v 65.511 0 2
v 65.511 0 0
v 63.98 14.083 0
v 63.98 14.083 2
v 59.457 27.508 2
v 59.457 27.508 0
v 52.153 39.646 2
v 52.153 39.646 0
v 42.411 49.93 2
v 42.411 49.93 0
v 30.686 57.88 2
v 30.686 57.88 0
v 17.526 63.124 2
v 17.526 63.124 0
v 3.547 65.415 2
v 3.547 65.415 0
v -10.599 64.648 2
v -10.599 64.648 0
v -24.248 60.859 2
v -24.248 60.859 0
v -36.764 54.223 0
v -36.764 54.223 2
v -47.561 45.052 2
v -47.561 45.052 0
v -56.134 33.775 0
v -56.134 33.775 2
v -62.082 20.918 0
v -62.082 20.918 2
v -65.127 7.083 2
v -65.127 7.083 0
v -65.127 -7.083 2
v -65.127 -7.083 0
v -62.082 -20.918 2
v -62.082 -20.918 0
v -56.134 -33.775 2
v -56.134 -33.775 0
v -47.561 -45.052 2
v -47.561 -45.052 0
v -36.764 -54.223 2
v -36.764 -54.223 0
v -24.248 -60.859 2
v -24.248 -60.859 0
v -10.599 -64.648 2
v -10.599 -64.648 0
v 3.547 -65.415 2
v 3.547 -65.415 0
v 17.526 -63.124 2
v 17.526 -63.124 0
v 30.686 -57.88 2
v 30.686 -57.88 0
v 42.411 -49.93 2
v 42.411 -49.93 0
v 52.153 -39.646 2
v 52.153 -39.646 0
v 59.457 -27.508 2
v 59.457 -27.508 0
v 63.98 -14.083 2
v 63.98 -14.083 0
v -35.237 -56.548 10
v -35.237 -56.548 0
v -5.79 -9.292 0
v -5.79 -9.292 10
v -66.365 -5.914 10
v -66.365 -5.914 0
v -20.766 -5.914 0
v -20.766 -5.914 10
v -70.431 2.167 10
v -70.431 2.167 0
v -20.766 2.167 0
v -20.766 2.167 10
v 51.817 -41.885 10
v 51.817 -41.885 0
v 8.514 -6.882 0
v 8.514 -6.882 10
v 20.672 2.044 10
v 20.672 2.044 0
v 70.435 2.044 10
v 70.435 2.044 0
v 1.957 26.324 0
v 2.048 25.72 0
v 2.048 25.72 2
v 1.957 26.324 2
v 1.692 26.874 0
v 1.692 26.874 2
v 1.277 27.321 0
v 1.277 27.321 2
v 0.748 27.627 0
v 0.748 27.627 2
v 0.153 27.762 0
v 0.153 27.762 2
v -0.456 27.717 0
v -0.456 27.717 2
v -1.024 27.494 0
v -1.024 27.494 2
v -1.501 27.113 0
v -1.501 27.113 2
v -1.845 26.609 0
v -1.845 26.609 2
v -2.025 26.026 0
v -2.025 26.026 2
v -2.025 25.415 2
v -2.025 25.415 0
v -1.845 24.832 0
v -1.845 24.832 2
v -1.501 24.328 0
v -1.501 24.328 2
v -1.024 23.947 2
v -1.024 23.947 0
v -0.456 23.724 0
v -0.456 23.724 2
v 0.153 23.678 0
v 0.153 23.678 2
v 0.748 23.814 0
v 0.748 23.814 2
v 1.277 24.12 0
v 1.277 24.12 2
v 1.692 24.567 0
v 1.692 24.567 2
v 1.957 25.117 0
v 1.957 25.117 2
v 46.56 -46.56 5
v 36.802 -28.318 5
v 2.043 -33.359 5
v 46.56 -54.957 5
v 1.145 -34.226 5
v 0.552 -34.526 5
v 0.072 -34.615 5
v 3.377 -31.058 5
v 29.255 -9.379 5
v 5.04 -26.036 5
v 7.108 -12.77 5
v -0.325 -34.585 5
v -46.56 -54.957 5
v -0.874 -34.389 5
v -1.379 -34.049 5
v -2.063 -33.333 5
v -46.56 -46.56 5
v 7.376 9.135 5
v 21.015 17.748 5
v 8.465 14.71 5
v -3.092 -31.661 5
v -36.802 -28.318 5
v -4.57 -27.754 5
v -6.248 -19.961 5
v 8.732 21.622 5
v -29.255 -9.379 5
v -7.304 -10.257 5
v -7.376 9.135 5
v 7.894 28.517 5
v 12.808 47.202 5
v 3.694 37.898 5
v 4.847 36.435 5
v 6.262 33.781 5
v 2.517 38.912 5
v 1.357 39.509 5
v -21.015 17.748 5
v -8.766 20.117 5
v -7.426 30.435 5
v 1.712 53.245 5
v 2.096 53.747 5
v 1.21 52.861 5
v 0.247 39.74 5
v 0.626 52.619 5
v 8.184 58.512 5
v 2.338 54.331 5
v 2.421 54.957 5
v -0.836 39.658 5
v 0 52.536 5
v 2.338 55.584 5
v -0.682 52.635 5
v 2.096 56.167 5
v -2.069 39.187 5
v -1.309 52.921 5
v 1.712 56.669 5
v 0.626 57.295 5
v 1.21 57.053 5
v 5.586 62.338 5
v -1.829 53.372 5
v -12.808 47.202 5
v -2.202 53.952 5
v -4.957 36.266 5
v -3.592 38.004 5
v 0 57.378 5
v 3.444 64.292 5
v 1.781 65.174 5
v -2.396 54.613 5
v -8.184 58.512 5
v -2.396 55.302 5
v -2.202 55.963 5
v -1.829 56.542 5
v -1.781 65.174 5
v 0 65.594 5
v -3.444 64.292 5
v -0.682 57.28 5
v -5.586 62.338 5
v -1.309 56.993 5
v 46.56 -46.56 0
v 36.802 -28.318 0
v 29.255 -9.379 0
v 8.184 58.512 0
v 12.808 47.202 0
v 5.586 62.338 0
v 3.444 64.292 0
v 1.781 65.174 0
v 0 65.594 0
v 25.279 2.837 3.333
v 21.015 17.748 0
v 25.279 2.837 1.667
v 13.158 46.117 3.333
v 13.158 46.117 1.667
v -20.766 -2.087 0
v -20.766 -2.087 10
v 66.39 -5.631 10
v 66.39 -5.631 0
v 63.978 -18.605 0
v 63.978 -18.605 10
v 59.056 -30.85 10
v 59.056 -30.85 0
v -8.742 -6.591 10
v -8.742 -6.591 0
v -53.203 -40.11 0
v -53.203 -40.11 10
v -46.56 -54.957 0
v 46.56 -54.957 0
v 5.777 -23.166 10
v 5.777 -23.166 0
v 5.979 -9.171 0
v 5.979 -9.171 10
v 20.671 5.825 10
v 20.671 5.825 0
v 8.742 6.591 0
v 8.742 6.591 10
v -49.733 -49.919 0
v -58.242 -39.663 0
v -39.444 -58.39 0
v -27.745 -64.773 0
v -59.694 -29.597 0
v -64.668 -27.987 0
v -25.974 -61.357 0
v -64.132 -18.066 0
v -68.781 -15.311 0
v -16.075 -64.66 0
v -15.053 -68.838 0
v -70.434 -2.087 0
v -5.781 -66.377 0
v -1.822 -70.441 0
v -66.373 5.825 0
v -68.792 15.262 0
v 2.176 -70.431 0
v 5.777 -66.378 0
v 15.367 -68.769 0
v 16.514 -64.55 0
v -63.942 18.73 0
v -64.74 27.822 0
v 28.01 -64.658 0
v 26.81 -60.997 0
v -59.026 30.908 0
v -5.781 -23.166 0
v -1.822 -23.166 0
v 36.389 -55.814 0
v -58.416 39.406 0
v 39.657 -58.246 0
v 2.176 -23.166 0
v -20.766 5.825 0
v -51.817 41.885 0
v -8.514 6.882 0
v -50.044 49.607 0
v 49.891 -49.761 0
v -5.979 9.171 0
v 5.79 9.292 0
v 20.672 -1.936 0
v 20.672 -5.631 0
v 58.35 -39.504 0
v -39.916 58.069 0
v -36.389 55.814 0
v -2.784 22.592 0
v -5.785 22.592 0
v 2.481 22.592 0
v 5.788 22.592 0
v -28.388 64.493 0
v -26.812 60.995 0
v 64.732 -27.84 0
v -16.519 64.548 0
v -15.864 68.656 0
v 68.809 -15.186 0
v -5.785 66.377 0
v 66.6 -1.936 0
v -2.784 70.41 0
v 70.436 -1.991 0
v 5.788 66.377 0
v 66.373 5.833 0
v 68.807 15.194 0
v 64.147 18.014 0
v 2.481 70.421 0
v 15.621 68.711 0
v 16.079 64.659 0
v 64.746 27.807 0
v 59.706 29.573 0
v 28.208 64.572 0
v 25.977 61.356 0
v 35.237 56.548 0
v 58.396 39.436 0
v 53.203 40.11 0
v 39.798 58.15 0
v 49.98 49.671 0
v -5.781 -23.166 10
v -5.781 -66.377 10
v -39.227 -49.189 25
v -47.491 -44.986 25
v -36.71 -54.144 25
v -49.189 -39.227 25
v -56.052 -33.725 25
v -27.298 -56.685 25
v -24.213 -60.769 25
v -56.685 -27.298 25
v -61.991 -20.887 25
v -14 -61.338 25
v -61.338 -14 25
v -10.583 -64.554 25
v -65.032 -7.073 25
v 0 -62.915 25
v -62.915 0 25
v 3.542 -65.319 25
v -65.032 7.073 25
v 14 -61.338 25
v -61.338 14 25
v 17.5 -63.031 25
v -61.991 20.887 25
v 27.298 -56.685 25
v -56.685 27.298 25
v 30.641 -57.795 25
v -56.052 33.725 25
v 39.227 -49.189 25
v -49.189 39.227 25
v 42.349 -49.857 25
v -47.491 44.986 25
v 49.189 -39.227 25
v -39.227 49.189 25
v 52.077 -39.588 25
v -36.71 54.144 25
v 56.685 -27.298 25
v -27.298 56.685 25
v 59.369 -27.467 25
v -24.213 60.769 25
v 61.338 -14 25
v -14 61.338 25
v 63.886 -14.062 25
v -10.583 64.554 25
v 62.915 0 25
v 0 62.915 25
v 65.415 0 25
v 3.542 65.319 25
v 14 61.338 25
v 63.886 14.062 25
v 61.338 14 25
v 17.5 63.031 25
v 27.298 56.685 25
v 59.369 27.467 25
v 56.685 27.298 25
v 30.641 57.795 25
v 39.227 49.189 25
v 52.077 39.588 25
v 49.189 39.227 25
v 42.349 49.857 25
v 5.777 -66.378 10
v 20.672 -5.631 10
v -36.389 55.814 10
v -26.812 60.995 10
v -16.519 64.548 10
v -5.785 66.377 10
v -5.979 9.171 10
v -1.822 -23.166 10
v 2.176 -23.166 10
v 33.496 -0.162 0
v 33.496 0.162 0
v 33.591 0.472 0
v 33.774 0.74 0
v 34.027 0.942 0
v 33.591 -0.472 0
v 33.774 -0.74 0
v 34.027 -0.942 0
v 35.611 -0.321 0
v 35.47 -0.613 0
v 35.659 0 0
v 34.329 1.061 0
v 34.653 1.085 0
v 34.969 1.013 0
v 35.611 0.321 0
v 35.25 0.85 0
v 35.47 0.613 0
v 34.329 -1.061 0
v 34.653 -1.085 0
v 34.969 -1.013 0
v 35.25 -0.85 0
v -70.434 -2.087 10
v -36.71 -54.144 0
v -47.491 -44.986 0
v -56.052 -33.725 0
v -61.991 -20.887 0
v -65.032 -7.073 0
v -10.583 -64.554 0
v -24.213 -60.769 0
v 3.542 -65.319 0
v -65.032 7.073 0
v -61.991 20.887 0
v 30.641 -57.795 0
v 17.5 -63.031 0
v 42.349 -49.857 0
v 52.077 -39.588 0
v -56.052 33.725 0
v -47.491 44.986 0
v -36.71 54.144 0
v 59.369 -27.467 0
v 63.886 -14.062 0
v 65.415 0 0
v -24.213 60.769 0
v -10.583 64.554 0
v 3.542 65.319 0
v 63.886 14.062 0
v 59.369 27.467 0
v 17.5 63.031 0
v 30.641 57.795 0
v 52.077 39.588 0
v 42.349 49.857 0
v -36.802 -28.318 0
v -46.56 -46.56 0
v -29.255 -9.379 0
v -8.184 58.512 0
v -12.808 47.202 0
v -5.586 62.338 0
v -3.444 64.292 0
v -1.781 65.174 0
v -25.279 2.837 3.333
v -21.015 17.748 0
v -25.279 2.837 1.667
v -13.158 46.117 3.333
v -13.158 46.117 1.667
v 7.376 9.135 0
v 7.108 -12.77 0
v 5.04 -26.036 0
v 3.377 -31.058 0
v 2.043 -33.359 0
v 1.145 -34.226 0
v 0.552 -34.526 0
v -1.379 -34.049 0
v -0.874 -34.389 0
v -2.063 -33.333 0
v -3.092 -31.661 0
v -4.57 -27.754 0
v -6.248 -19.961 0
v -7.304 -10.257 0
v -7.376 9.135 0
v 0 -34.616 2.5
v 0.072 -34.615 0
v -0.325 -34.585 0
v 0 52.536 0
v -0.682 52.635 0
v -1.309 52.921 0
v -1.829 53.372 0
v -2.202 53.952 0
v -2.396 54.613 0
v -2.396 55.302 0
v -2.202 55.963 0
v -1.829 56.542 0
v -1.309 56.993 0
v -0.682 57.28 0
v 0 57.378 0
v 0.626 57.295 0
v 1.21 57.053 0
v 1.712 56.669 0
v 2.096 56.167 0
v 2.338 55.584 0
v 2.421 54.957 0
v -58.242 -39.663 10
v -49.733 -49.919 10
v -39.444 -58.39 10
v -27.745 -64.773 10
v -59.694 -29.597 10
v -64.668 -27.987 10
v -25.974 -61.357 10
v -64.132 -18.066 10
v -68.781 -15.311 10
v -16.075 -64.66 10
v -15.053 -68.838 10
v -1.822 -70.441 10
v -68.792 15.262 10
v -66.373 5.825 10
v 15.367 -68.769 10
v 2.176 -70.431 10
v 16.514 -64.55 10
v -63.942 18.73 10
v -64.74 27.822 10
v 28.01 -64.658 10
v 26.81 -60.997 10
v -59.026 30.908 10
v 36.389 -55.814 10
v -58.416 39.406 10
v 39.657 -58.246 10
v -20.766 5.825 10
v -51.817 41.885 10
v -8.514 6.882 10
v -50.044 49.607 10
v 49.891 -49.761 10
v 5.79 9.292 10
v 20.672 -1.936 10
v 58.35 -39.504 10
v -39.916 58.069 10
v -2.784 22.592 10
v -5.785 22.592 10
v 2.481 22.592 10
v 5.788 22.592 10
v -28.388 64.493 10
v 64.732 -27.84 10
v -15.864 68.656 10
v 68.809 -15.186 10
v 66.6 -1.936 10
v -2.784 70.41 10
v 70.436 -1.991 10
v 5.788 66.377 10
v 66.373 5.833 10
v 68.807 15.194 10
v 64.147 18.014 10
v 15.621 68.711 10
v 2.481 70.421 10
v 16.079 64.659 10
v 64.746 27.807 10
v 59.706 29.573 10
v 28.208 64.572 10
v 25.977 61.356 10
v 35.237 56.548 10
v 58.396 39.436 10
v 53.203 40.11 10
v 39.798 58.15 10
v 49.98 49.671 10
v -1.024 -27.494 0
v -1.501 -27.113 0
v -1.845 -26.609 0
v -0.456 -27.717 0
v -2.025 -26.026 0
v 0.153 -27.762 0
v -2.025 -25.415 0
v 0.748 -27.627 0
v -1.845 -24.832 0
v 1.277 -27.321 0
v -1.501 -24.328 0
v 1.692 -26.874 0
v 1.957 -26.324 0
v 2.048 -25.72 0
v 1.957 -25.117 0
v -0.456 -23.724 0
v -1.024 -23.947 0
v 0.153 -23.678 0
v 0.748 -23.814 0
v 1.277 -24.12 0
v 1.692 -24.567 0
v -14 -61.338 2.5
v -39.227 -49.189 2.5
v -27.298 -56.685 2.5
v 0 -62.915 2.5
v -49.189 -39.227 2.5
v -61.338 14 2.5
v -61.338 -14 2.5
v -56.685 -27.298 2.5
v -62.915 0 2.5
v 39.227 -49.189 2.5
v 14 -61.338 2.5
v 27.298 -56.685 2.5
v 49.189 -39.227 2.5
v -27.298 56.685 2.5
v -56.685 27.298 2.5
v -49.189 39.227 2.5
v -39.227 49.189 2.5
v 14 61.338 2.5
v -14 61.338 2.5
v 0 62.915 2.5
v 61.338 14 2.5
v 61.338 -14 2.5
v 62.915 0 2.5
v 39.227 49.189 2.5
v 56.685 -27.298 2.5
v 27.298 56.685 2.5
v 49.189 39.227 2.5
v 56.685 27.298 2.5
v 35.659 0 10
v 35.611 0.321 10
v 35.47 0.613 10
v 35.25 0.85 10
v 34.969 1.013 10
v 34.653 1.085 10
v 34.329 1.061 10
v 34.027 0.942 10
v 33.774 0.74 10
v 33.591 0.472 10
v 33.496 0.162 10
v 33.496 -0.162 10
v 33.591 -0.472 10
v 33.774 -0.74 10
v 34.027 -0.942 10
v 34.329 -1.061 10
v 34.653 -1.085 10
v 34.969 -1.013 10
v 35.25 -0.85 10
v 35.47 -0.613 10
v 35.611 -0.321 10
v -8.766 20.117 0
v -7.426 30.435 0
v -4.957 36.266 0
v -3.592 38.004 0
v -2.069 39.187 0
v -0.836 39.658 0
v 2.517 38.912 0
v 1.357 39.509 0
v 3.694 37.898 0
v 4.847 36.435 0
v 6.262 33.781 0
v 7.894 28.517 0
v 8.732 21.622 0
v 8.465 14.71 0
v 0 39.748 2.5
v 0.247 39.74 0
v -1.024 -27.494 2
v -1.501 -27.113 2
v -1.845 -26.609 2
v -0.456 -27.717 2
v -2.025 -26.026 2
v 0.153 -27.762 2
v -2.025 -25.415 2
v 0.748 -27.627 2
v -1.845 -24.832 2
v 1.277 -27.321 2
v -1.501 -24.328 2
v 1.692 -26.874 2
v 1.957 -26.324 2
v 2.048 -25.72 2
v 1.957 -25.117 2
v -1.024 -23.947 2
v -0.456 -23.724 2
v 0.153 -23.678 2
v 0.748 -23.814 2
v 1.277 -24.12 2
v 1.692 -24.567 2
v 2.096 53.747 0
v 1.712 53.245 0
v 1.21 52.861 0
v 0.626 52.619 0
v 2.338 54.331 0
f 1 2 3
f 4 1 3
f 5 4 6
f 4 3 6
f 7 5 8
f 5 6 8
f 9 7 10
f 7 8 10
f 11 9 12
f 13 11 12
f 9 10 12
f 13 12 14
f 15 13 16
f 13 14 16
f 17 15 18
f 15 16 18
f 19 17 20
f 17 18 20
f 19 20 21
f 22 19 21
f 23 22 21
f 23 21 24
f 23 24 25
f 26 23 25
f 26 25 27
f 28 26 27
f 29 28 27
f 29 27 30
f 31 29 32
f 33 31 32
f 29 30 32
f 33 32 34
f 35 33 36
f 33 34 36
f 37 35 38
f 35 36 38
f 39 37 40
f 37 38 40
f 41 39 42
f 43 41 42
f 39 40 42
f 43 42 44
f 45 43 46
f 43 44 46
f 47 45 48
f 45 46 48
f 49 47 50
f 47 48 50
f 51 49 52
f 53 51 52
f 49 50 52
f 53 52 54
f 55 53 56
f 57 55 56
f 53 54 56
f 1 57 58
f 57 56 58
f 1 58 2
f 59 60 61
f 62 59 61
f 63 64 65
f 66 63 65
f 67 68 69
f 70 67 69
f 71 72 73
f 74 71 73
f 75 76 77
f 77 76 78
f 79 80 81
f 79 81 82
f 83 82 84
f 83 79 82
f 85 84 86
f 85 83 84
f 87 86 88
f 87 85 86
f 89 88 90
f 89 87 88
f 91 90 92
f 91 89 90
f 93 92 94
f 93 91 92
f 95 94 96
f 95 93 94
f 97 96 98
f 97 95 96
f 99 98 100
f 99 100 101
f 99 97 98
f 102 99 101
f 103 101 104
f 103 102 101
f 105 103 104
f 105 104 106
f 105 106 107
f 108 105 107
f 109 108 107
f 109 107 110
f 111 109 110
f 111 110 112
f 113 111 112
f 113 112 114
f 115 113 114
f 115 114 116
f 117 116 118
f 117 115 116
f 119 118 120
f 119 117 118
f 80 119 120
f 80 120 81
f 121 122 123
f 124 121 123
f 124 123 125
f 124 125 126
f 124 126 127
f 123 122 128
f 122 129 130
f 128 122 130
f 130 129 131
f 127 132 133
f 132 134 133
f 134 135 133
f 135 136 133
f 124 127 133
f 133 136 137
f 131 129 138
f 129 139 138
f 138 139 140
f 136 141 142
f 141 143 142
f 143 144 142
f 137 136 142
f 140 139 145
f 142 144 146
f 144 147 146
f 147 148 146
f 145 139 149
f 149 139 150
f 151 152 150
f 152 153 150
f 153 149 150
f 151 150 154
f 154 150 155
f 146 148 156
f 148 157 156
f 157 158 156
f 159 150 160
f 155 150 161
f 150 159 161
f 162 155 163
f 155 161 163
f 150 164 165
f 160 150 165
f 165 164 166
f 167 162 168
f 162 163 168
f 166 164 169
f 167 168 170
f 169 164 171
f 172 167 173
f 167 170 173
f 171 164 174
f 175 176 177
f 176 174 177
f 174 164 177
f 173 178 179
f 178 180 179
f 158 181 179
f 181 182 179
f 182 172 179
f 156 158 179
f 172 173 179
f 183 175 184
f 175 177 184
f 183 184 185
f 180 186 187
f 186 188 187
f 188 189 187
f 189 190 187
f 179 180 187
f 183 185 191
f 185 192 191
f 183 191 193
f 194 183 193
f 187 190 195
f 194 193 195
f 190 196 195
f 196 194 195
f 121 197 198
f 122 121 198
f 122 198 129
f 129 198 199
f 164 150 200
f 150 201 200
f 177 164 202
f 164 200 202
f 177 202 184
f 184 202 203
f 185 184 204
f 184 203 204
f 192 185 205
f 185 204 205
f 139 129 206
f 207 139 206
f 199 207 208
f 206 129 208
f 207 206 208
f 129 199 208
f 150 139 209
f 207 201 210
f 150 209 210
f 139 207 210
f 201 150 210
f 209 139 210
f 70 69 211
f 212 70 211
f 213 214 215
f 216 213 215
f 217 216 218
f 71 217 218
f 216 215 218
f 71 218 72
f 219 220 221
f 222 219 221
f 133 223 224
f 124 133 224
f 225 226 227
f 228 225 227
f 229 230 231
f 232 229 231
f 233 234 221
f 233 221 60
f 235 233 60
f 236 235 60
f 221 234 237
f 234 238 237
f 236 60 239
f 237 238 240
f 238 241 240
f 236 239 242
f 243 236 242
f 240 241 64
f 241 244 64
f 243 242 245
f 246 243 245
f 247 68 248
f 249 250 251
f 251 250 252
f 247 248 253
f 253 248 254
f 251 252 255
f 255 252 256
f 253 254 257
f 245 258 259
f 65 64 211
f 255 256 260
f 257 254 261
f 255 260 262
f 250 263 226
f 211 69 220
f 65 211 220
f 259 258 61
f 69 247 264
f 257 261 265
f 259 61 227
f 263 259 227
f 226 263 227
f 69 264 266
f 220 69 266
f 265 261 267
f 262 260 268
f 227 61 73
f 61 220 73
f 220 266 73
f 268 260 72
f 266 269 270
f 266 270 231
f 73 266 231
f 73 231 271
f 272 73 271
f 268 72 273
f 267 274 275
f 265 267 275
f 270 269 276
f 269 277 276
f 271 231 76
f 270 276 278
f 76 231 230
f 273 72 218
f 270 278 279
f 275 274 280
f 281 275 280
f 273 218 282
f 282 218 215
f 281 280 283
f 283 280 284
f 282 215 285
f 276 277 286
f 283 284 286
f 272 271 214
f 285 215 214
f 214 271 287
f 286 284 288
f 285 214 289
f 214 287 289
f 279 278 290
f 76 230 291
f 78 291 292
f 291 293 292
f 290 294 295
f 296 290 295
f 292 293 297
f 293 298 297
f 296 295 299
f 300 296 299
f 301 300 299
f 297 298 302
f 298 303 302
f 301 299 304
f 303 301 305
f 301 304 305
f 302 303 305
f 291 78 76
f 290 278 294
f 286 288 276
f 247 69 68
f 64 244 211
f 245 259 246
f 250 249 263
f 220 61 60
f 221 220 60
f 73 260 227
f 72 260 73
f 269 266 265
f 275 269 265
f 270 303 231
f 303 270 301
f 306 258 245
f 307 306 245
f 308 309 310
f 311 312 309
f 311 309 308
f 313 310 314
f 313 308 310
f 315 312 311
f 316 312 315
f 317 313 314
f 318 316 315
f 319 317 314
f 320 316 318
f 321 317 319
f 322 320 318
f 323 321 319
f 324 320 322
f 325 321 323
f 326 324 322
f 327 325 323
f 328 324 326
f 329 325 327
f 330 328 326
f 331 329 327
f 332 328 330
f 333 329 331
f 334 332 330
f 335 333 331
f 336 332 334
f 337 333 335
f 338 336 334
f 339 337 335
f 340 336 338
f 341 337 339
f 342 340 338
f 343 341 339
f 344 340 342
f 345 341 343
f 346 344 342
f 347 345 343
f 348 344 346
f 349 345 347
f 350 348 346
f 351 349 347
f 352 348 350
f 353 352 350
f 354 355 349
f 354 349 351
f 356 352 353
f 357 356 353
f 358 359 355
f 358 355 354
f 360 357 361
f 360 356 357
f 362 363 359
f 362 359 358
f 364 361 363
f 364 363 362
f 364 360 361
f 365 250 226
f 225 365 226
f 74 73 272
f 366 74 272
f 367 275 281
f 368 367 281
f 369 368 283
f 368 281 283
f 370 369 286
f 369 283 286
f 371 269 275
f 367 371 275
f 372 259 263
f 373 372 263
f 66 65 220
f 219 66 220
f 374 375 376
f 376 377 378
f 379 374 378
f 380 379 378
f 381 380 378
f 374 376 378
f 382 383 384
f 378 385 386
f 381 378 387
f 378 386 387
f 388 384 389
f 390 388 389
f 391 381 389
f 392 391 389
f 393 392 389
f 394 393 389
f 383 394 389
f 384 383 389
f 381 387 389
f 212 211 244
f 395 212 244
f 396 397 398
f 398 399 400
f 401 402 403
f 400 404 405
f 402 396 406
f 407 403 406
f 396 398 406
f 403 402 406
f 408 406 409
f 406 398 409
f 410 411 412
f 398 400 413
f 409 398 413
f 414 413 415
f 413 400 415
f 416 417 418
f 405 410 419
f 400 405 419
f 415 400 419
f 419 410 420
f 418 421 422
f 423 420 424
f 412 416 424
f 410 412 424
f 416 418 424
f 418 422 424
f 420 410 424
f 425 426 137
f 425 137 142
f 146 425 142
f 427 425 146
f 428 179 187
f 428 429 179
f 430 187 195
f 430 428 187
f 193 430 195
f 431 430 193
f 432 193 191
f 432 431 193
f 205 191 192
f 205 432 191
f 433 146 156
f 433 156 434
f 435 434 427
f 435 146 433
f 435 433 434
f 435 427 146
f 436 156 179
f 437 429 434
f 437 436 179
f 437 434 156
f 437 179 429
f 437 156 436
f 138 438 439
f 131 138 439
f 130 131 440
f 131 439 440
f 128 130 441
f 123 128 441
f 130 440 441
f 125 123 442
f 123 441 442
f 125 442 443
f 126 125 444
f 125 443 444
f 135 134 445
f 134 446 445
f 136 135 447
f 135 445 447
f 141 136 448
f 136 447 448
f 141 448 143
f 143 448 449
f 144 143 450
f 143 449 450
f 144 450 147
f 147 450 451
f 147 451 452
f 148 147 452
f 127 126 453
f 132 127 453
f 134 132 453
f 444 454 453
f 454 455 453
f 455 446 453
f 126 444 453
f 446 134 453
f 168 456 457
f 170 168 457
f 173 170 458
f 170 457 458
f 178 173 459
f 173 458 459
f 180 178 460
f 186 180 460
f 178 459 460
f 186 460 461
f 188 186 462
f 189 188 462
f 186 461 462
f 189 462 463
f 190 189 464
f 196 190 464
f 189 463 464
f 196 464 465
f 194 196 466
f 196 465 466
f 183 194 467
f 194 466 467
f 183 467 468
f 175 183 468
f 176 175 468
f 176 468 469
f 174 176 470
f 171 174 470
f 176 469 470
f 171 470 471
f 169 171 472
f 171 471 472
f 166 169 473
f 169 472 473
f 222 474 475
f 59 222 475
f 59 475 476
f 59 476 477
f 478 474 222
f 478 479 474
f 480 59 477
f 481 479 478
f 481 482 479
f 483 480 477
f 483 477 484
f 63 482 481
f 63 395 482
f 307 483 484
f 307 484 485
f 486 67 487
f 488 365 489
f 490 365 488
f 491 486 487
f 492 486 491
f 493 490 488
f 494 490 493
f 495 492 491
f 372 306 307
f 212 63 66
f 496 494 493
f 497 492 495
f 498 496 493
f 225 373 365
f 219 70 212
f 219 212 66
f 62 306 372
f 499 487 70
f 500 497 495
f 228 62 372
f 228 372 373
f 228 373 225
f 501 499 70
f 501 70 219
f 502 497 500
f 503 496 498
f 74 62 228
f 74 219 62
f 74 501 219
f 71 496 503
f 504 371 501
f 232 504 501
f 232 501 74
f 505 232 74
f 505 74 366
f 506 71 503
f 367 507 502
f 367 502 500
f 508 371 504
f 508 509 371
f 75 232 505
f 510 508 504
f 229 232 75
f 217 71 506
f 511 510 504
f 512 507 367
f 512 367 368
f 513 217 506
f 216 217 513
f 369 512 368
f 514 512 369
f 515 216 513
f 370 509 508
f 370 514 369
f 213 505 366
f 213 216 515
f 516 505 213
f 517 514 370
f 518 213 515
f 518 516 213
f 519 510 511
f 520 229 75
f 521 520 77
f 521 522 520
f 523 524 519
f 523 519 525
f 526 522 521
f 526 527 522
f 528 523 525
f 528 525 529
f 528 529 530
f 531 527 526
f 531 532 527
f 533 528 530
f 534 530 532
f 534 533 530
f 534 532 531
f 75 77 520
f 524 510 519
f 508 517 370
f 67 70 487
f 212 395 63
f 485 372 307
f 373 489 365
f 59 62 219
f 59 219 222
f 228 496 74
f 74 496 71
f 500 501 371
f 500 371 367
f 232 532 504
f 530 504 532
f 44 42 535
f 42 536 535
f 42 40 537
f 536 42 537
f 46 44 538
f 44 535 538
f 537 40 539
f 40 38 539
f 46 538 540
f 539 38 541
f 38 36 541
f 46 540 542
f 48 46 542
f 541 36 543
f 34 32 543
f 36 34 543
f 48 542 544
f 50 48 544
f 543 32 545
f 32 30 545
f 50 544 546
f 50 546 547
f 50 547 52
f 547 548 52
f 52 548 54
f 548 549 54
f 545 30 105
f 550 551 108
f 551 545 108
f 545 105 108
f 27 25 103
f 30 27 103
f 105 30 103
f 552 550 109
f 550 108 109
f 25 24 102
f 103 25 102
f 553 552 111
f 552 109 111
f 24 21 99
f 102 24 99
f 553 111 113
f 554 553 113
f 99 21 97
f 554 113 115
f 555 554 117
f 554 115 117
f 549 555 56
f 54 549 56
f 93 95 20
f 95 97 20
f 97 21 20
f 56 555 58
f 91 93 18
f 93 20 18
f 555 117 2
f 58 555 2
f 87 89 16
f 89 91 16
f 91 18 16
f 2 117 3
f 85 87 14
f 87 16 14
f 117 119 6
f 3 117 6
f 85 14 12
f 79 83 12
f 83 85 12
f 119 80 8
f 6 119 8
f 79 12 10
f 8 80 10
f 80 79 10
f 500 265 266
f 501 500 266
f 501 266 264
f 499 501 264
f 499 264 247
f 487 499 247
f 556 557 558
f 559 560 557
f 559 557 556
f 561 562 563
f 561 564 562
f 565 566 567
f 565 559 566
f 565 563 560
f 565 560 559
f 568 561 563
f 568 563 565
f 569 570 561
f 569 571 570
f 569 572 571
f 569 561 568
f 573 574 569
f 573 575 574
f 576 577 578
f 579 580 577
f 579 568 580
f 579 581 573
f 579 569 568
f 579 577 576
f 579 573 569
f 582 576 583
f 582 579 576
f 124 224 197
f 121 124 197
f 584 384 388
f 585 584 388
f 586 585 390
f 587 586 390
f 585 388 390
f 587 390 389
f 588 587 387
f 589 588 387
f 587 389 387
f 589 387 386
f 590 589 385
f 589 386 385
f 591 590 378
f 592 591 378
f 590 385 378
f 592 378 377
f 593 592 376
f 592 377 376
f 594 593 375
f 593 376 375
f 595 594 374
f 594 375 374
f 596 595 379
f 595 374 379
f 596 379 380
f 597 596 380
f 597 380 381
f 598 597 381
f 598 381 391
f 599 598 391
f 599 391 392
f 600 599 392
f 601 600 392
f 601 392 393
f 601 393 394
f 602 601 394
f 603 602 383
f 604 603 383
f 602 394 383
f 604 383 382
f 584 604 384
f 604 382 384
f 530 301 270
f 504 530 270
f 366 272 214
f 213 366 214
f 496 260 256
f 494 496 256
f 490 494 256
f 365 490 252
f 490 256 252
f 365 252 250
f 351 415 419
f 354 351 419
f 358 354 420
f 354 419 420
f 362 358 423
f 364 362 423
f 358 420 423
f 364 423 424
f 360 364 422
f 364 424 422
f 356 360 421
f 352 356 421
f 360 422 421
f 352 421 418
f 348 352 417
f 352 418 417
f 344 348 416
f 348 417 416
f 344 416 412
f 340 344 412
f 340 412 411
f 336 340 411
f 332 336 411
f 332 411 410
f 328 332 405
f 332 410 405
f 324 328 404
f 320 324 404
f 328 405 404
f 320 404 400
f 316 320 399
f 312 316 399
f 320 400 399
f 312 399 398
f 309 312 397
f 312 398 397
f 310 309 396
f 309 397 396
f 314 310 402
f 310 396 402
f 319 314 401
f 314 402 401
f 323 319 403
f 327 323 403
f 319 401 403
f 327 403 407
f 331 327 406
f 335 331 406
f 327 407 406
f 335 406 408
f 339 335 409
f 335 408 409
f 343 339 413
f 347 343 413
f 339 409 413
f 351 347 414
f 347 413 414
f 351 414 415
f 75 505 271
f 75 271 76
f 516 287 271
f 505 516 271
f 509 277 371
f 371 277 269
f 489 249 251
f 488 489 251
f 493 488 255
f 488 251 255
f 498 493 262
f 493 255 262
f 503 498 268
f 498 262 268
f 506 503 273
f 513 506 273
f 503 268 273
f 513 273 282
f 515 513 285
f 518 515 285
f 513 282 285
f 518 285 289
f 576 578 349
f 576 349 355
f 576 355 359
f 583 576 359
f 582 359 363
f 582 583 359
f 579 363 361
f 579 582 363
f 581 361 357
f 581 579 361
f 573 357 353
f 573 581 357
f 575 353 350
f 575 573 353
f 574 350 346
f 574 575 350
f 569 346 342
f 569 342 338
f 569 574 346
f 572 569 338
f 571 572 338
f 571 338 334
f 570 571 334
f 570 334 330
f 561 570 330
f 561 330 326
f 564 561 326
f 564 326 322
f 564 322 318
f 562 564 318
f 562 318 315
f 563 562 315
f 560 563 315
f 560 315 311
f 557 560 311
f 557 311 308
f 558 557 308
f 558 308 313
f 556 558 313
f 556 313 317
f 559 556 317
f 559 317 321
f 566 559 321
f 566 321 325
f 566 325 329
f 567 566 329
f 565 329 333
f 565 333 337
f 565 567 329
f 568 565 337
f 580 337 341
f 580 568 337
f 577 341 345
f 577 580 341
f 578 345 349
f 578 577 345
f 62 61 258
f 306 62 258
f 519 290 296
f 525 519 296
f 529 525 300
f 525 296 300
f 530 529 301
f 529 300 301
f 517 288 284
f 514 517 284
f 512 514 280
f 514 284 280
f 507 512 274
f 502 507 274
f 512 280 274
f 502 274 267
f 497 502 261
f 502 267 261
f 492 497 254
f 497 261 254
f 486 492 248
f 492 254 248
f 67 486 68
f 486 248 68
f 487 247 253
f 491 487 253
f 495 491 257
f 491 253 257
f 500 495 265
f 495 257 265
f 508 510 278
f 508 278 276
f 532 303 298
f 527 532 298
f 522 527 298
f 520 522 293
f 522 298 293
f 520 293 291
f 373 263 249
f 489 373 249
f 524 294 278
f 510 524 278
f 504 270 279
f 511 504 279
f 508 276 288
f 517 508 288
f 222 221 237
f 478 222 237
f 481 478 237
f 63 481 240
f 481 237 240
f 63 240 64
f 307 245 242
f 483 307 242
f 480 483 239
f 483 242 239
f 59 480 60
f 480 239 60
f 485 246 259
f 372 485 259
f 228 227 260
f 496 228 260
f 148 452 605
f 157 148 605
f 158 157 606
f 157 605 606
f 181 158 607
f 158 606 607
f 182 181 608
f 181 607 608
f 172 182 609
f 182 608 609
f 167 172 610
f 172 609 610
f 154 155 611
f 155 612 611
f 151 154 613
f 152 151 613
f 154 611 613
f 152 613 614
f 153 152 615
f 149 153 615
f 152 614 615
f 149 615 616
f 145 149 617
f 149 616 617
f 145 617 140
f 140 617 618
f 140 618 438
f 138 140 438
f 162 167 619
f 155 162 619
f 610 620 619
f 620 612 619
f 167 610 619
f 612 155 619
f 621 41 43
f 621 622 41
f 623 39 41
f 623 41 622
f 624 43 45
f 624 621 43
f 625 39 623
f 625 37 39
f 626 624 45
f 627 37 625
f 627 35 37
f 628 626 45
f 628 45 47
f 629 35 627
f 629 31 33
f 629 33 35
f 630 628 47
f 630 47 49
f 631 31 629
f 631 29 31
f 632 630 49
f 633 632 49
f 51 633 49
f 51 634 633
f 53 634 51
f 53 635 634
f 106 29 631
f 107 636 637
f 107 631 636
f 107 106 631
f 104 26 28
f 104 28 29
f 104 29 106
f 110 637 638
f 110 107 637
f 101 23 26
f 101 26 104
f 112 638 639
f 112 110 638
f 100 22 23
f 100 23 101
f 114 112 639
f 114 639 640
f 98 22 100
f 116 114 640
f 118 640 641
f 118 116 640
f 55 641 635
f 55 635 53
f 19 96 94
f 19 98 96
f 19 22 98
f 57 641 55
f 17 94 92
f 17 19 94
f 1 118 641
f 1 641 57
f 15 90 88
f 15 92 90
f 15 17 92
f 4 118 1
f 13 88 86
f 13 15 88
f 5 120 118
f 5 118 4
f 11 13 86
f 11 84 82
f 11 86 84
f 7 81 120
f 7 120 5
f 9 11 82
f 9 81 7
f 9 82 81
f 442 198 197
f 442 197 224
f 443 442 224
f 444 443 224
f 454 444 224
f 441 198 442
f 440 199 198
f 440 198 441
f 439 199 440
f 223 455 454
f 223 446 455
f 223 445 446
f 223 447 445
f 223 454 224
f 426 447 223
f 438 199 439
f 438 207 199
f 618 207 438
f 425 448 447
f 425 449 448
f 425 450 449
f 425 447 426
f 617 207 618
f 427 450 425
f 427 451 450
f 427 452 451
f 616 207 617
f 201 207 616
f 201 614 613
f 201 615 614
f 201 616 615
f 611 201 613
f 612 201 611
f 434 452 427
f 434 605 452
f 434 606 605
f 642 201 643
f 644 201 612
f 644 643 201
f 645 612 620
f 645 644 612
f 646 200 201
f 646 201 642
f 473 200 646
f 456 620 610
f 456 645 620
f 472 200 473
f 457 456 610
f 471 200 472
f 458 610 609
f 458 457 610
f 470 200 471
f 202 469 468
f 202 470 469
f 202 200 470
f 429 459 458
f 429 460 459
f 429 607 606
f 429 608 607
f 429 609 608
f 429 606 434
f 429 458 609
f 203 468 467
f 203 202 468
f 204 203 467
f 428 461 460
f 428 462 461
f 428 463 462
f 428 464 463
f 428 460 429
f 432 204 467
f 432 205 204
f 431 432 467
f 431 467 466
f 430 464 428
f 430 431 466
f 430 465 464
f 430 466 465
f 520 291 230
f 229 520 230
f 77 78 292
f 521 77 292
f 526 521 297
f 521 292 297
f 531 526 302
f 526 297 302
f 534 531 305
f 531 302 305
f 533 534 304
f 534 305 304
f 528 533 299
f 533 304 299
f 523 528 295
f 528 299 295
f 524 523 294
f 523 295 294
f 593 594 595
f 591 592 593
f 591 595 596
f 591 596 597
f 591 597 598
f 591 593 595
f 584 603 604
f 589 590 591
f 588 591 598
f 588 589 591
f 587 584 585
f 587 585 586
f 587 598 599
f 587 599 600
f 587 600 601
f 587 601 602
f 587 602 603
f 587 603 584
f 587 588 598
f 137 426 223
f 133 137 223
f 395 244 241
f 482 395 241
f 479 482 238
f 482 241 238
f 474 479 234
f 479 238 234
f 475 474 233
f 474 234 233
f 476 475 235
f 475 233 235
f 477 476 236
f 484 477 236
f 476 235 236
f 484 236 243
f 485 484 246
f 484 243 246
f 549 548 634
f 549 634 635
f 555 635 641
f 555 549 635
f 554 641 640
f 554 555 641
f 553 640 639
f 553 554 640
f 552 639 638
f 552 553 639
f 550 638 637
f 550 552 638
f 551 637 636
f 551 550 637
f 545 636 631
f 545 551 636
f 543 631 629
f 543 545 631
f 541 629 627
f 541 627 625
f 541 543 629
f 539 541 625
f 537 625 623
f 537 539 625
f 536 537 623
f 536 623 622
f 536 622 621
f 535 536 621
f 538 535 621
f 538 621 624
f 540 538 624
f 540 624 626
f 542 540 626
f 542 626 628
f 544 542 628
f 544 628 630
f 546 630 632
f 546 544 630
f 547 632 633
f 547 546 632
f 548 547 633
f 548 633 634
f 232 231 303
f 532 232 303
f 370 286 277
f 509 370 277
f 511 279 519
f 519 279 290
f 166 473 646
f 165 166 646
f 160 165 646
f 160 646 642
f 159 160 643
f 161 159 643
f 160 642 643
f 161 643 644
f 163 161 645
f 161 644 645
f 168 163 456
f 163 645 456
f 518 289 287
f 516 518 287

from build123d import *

# Parameters (mm, degrees)
F1_R     = 65.415344
F2_DEPTH = 25
F3_T     = -2.5
F4_R     = 65.511445
F4_R_2   = 2.047697
F5_DEPTH = 2
F7_DEPTH = 5
F0_W     = 7.06006
F0_H     = 3.979711
F0_R     = 1.087828
F8_DEPTH = 10


with BuildPart() as f2:
    # F1 (on Top) → F2 (new body)
    with BuildSketch(Plane.XY):
        Circle(F1_R)
    extrude(amount=F2_DEPTH)

    # F3
    f3_openings = [f2.faces().sort_by_distance(p)[0] for p in [
        (0, 0, 25),
    ]]
    offset(amount=F3_T, openings=f3_openings)


with BuildPart() as f5:
    # F4 (on Top) → F5 (new body)
    with BuildSketch(Plane.XY):
        Circle(F4_R)
        with Locations((0, -25.720464)):
            Circle(F4_R_2, mode=Mode.SUBTRACT)
        with Locations((0, 25.720464)):
            Circle(F4_R_2, mode=Mode.SUBTRACT)
    extrude(amount=F5_DEPTH)


with BuildPart() as f7:
    # F6 (on Top) → F7 (new body)
    with BuildSketch(Plane.XY):
        with BuildLine():
            add(Edge.make_bspline(
                [(-46.559539, -46.559542), (-17.301039, 0), (-17.074941, 63.914396), (0, 65.593898)],
                knots=[0, 0, 0, 0, 121.433871, 121.433871, 121.433871, 121.433871], degree=3))
            Line((-46.559539, -46.559542), (0, -46.559542))
            Line((0, -46.559542), (0, -34.616411))
            add(Edge.make_bspline(
                [(-7.37629, 9.135005), (-10.020666, -34.616411), (0, -34.616411)],
                knots=[4.445334, 4.445334, 4.445334, 6.283185, 6.283185, 6.283185], degree=2, weights=[1, 0.606674, 1]))
            add(Edge.make_bspline(
                [(0, 39.748225), (-16.047853, 39.748225), (-7.37629, 9.135005)],
                knots=[3.141593, 3.141593, 3.141593, 5.28325, 5.28325, 5.28325], degree=2, weights=[1, 0.479397, 1]))
            Line((0, 39.748225), (0, 52.536493))
            ThreePointArc((0, 52.536493), (-2.420558, 54.957051), (0, 57.377609))
            Line((0, 57.377609), (0, 65.593898))
        make_face()
        Polygon((0, -46.559542), (-46.559539, -46.559542), (-46.559539, -54.957051), (46.559539, -54.957051), (46.559539, -46.559542), align=None)
        with BuildLine():
            Line((0, -34.616411), (0, -46.559542))
            Line((0, -46.559542), (46.559539, -46.559542))
            add(Edge.make_bspline(
                [(46.559539, -46.559542), (17.301039, 0), (17.074941, 63.914396), (0, 65.593898)],
                knots=[0, 0, 0, 0, 121.433871, 121.433871, 121.433871, 121.433871], degree=3))
            Line((0, 65.593898), (0, 57.377609))
            ThreePointArc((0, 57.377609), (1.711593, 56.668644), (2.420558, 54.957051))
            ThreePointArc((2.420558, 54.957051), (1.711593, 53.245458), (0, 52.536493))
            Line((0, 52.536493), (0, 39.748225))
            add(Edge.make_bspline(
                [(7.37629, 9.135005), (16.047853, 39.748225), (0, 39.748225)],
                knots=[0.999935, 0.999935, 0.999935, 3.141593, 3.141593, 3.141593], degree=2, weights=[1, 0.479397, 1]))
            add(Edge.make_bspline(
                [(0, -34.616411), (10.020666, -34.616411), (7.37629, 9.135005)],
                knots=[0, 0, 0, 1.837852, 1.837852, 1.837852], degree=2, weights=[1, 0.606674, 1]))
        make_face()
    extrude(amount=F7_DEPTH)


with BuildPart() as f8:
    # F0 (on Top) → F8 (new body)
    with BuildSketch(Plane.XY):
        with BuildLine():
            Line((-1.822446, -23.166081), (2.176449, -23.166081))
            Line((2.176449, -23.166081), (2.176449, -10.729756))
            ThreePointArc((2.176449, -10.729756), (0.18003, -10.946789), (-1.822446, -10.795521))
            Line((-1.822446, -10.795521), (-1.822446, -23.166081))
        make_face()
        with BuildLine():
            Line((20.671686, 2.043886), (66.597078, 2.043886))
            ThreePointArc((66.597078, 2.043886), (66.511847, 3.939863), (66.372649, 5.832643))
            Line((66.372649, 5.832643), (20.671034, 5.824757))
            Line((20.671034, 5.824757), (20.671686, 2.043886))
        make_face()
        with BuildLine():
            ThreePointArc((-53.202577, -40.110273), (-44.977006, -49.157066), (-35.236739, -56.54839))
            Line((-35.236739, -56.54839), (-5.79004, -9.291934))
            ThreePointArc((-5.79004, -9.291934), (-7.390544, -8.077404), (-8.742155, -6.590851))
            Line((-8.742155, -6.590851), (-53.202577, -40.110273))
        make_face()
        with BuildLine():
            Line((5.787745, 22.5925), (2.480929, 22.5925))
            Line((2.480929, 22.5925), (2.480929, 10.663469))
            ThreePointArc((2.480929, 10.663469), (4.191958, 10.113955), (5.79004, 9.291934))
            Line((5.79004, 9.291934), (5.787745, 22.5925))
        make_face()
        with BuildLine():
            Line((2.176449, -23.166081), (2.176449, -66.592877))
            ThreePointArc((2.176449, -66.592877), (3.978074, -66.509572), (5.776785, -66.377534))
            Line((5.776785, -66.377534), (5.776785, -23.166081))
            Line((5.776785, -23.166081), (2.176449, -23.166081))
        make_face()
        with BuildLine():
            Line((-2.784222, 10.588328), (-2.784222, 22.5925))
            Line((-2.784222, 22.5925), (-5.785265, 22.5925))
            Line((-5.785265, 22.5925), (-5.979406, 9.171221))
            ThreePointArc((-5.979406, 9.171221), (-4.438732, 10.008109), (-2.784222, 10.588328))
        make_face()
        with BuildLine():
            Line((2.176449, -10.729756), (2.176449, -23.166081))
            Line((2.176449, -23.166081), (5.776785, -23.166081))
            Line((5.776785, -23.166081), (5.979406, -9.171221))
            ThreePointArc((5.979406, -9.171221), (4.151716, -10.13054), (2.176449, -10.729756))
        make_face()
        with BuildLine():
            Line((-5.979406, 9.171221), (-36.389173, 55.813765))
            ThreePointArc((-36.389173, 55.813765), (-44.649641, 49.454603), (-51.817096, 41.884804))
            Line((-51.817096, 41.884804), (-8.514495, 6.882438))
            ThreePointArc((-8.514495, 6.882438), (-7.336752, 8.126295), (-5.979406, 9.171221))
        make_face()
        with BuildLine():
            ThreePointArc((-5.781071, -66.377161), (-3.803442, -66.519787), (-1.822446, -66.603505))
            Line((-1.822446, -66.603505), (-1.822446, -23.166081))
            Line((-1.822446, -23.166081), (-5.781071, -23.166081))
            Line((-5.781071, -23.166081), (-5.781071, -66.377161))
        make_face()
        with BuildLine():
            ThreePointArc((-66.373346, 5.824708), (-66.50841, 3.99746), (-66.593179, 2.167189))
            Line((-66.593179, 2.167189), (-20.765832, 2.167189))
            Line((-20.765832, 2.167189), (-20.765832, 5.824708))
            Line((-20.765832, 5.824708), (-66.373346, 5.824708))
        make_face()
        with BuildLine():
            ThreePointArc((36.389173, -55.813765), (44.649641, -49.454603), (51.817096, -41.884804))
            Line((51.817096, -41.884804), (8.514495, -6.882438))
            ThreePointArc((8.514495, -6.882438), (7.336752, -8.126295), (5.979406, -9.171221))
            Line((5.979406, -9.171221), (36.389173, -55.813765))
        make_face()
        with BuildLine():
            Line((-5.781071, -23.166081), (-1.822446, -23.166081))
            Line((-1.822446, -23.166081), (-1.822446, -10.795521))
            ThreePointArc((-1.822446, -10.795521), (-3.879778, -10.237769), (-5.79004, -9.291934))
            Line((-5.79004, -9.291934), (-5.781071, -23.166081))
        make_face()
        with BuildLine():
            Line((-20.765832, 5.824708), (-20.765832, 2.167189))
            Line((-20.765832, 2.167189), (-10.73163, 2.167189))
            ThreePointArc((-10.73163, 2.167189), (-9.90766, 4.658633), (-8.514495, 6.882438))
            Line((-8.514495, 6.882438), (-20.765832, 5.824708))
        make_face()
        with BuildLine():
            Line((20.671686, -1.935825), (20.671686, 2.043886))
            Line((20.671686, 2.043886), (10.755795, 2.043886))
            ThreePointArc((10.755795, 2.043886), (10.900044, 1.026465), (10.948269, 0))
            ThreePointArc((10.948269, 0), (10.905058, -0.971748), (10.775768, -1.935825))
            Line((10.775768, -1.935825), (20.671686, -1.935825))
        make_face()
        with BuildLine():
            ThreePointArc((2.176449, -70.431022), (49.891466, -49.7605), (70.436499, -1.991316))
            Line((70.436499, -1.991316), (66.600307, -1.935825))
            ThreePointArc((66.600307, -1.935825), (66.520854, -3.784731), (66.390084, -5.630716))
            ThreePointArc((66.390084, -5.630716), (61.820903, -24.850033), (51.817096, -41.884804))
            ThreePointArc((51.817096, -41.884804), (44.649641, -49.454603), (36.389173, -55.813765))
            ThreePointArc((36.389173, -55.813765), (21.734542, -62.983791), (5.776785, -66.377534))
            ThreePointArc((5.776785, -66.377534), (3.978074, -66.509572), (2.176449, -66.592877))
            Line((2.176449, -66.592877), (2.176449, -70.431022))
        make_face()
        with BuildLine():
            Line((-2.784222, 66.570236), (-2.784222, 70.409615))
            ThreePointArc((-2.784222, 70.409615), (-50.043837, 49.607259), (-70.431307, 2.167189))
            Line((-70.431307, 2.167189), (-66.593179, 2.167189))
            ThreePointArc((-66.593179, 2.167189), (-66.50841, 3.99746), (-66.373346, 5.824708))
            ThreePointArc((-66.373346, 5.824708), (-61.784527, 24.940338), (-51.817096, 41.884804))
            ThreePointArc((-51.817096, 41.884804), (-44.649641, 49.454603), (-36.389173, 55.813765))
            ThreePointArc((-36.389173, 55.813765), (-21.738565, 62.982403), (-5.785265, 66.376795))
            ThreePointArc((-5.785265, 66.376795), (-4.285835, 66.490449), (-2.784222, 66.570236))
        make_face()
        with BuildLine():
            Line((8.742155, 6.590851), (53.202577, 40.110273))
            ThreePointArc((53.202577, 40.110273), (44.977006, 49.157066), (35.236739, 56.54839))
            Line((35.236739, 56.54839), (5.79004, 9.291934))
            ThreePointArc((5.79004, 9.291934), (7.390544, 8.077404), (8.742155, 6.590851))
        make_face()
        with BuildLine():
            Line((-10.73163, 2.167189), (-20.765832, 2.167189))
            Line((-20.765832, 2.167189), (-20.765832, -2.086523))
            Line((-20.765832, -2.086523), (-10.747605, -2.086523))
            ThreePointArc((-10.747605, -2.086523), (-10.948192, 0.041116), (-10.73163, 2.167189))
        make_face()
        with BuildLine():
            ThreePointArc((10.948269, 0), (10.900044, 1.026465), (10.755795, 2.043886))
            ThreePointArc((10.755795, 2.043886), (10.010556, 4.433211), (8.742155, 6.590851))
            ThreePointArc((8.742155, 6.590851), (7.390544, 8.077404), (5.79004, 9.291934))
            ThreePointArc((5.79004, 9.291934), (4.191958, 10.113955), (2.480929, 10.663469))
            ThreePointArc((2.480929, 10.663469), (-0.156231, 10.947154), (-2.784222, 10.588328))
            ThreePointArc((-2.784222, 10.588328), (-4.438732, 10.008109), (-5.979406, 9.171221))
            ThreePointArc((-5.979406, 9.171221), (-7.336752, 8.126295), (-8.514495, 6.882438))
            ThreePointArc((-8.514495, 6.882438), (-9.90766, 4.658633), (-10.73163, 2.167189))
            ThreePointArc((-10.73163, 2.167189), (-10.948192, 0.041116), (-10.747605, -2.086523))
            ThreePointArc((-10.747605, -2.086523), (-10.001746, -4.453051), (-8.742155, -6.590851))
            ThreePointArc((-8.742155, -6.590851), (-7.390544, -8.077404), (-5.79004, -9.291934))
            ThreePointArc((-5.79004, -9.291934), (-3.879778, -10.237769), (-1.822446, -10.795521))
            ThreePointArc((-1.822446, -10.795521), (0.18003, -10.946789), (2.176449, -10.729756))
            ThreePointArc((2.176449, -10.729756), (4.151716, -10.13054), (5.979406, -9.171221))
            ThreePointArc((5.979406, -9.171221), (7.336752, -8.126295), (8.514495, -6.882438))
            ThreePointArc((8.514495, -6.882438), (9.957199, -4.551789), (10.775768, -1.935825))
            ThreePointArc((10.775768, -1.935825), (10.905058, -0.971748), (10.948269, 0))
        make_face()
        with Locations((0.07282, 0.054031)):
            Rectangle(F0_W, F0_H, mode=Mode.SUBTRACT)
        with BuildLine():
            Line((10.755795, 2.043886), (20.671686, 2.043886))
            Line((20.671686, 2.043886), (20.671034, 5.824757))
            Line((20.671034, 5.824757), (8.742155, 6.590851))
            ThreePointArc((8.742155, 6.590851), (10.010556, 4.433211), (10.755795, 2.043886))
        make_face()
        with BuildLine():
            Line((2.480929, 10.663469), (2.480929, 22.5925))
            Line((2.480929, 22.5925), (-2.784222, 22.5925))
            Line((-2.784222, 22.5925), (-2.784222, 10.588328))
            ThreePointArc((-2.784222, 10.588328), (-0.156231, 10.947154), (2.480929, 10.663469))
        make_face()
        with BuildLine():
            ThreePointArc((-70.433743, -2.086523), (-49.732537, -49.91934), (-1.822446, -70.441071))
            Line((-1.822446, -70.441071), (-1.822446, -66.603505))
            ThreePointArc((-1.822446, -66.603505), (-3.803442, -66.519787), (-5.781071, -66.377161))
            ThreePointArc((-5.781071, -66.377161), (-21.089485, -63.202705), (-35.236739, -56.54839))
            ThreePointArc((-35.236739, -56.54839), (-44.977006, -49.157066), (-53.202577, -40.110273))
            ThreePointArc((-53.202577, -40.110273), (-62.18106, -23.934577), (-66.365488, -5.913566))
            ThreePointArc((-66.365488, -5.913566), (-66.508155, -4.001701), (-66.595756, -2.086523))
            Line((-66.595756, -2.086523), (-70.433743, -2.086523))
        make_face()
        with BuildLine():
            ThreePointArc((5.787745, 66.376579), (4.135616, 66.499962), (2.480929, 66.582229))
            Line((2.480929, 66.582229), (2.480929, 22.5925))
            Line((2.480929, 22.5925), (5.787745, 22.5925))
            Line((5.787745, 22.5925), (5.787745, 66.376579))
        make_face()
        with BuildLine():
            Line((66.597078, 2.043886), (70.434993, 2.043886))
            ThreePointArc((70.434993, 2.043886), (49.980384, 49.671189), (2.480929, 70.420954))
            Line((2.480929, 70.420954), (2.480929, 66.582229))
            ThreePointArc((2.480929, 66.582229), (4.135616, 66.499962), (5.787745, 66.376579))
            ThreePointArc((5.787745, 66.376579), (21.092662, 63.201644), (35.236739, 56.54839))
            ThreePointArc((35.236739, 56.54839), (44.977006, 49.157066), (53.202577, 40.110273))
            ThreePointArc((53.202577, 40.110273), (62.19564, 23.896665), (66.372649, 5.832643))
            ThreePointArc((66.372649, 5.832643), (66.511847, 3.939863), (66.597078, 2.043886))
        make_face()
        with BuildLine():
            Line((-2.784222, 22.5925), (-2.784222, 66.570236))
            ThreePointArc((-2.784222, 66.570236), (-4.285835, 66.490449), (-5.785265, 66.376795))
            Line((-5.785265, 66.376795), (-5.785265, 22.5925))
            Line((-5.785265, 22.5925), (-2.784222, 22.5925))
        make_face()
        with Locations((0.07282, 0.054031)):
            Rectangle(F0_W, F0_H)
        with BuildLine():
            Line((-20.765832, -2.086523), (-66.595756, -2.086523))
            ThreePointArc((-66.595756, -2.086523), (-66.508155, -4.001701), (-66.365488, -5.913566))
            Line((-66.365488, -5.913566), (-20.765832, -5.913566))
            Line((-20.765832, -5.913566), (-20.765832, -2.086523))
        make_face()
        with BuildLine():
            ThreePointArc((66.390084, -5.630716), (66.520854, -3.784731), (66.600307, -1.935825))
            Line((66.600307, -1.935825), (20.671686, -1.935825))
            Line((20.671686, -1.935825), (20.671686, -5.630716))
            Line((20.671686, -5.630716), (66.390084, -5.630716))
        make_face()
        with BuildLine():
            Line((-10.747605, -2.086523), (-20.765832, -2.086523))
            Line((-20.765832, -2.086523), (-20.765832, -5.913566))
            Line((-20.765832, -5.913566), (-8.742155, -6.590851))
            ThreePointArc((-8.742155, -6.590851), (-10.001746, -4.453051), (-10.747605, -2.086523))
        make_face()
        with BuildLine():
            Line((20.671686, -5.630716), (20.671686, -1.935825))
            Line((20.671686, -1.935825), (10.775768, -1.935825))
            ThreePointArc((10.775768, -1.935825), (9.957199, -4.551789), (8.514495, -6.882438))
            Line((8.514495, -6.882438), (20.671686, -5.630716))
        make_face()
        with Locations((34.571357, 0)):
            Circle(F0_R)
    extrude(amount=F8_DEPTH)


solid = Compound([f2.part, f5.part, f7.part, f8.part])
